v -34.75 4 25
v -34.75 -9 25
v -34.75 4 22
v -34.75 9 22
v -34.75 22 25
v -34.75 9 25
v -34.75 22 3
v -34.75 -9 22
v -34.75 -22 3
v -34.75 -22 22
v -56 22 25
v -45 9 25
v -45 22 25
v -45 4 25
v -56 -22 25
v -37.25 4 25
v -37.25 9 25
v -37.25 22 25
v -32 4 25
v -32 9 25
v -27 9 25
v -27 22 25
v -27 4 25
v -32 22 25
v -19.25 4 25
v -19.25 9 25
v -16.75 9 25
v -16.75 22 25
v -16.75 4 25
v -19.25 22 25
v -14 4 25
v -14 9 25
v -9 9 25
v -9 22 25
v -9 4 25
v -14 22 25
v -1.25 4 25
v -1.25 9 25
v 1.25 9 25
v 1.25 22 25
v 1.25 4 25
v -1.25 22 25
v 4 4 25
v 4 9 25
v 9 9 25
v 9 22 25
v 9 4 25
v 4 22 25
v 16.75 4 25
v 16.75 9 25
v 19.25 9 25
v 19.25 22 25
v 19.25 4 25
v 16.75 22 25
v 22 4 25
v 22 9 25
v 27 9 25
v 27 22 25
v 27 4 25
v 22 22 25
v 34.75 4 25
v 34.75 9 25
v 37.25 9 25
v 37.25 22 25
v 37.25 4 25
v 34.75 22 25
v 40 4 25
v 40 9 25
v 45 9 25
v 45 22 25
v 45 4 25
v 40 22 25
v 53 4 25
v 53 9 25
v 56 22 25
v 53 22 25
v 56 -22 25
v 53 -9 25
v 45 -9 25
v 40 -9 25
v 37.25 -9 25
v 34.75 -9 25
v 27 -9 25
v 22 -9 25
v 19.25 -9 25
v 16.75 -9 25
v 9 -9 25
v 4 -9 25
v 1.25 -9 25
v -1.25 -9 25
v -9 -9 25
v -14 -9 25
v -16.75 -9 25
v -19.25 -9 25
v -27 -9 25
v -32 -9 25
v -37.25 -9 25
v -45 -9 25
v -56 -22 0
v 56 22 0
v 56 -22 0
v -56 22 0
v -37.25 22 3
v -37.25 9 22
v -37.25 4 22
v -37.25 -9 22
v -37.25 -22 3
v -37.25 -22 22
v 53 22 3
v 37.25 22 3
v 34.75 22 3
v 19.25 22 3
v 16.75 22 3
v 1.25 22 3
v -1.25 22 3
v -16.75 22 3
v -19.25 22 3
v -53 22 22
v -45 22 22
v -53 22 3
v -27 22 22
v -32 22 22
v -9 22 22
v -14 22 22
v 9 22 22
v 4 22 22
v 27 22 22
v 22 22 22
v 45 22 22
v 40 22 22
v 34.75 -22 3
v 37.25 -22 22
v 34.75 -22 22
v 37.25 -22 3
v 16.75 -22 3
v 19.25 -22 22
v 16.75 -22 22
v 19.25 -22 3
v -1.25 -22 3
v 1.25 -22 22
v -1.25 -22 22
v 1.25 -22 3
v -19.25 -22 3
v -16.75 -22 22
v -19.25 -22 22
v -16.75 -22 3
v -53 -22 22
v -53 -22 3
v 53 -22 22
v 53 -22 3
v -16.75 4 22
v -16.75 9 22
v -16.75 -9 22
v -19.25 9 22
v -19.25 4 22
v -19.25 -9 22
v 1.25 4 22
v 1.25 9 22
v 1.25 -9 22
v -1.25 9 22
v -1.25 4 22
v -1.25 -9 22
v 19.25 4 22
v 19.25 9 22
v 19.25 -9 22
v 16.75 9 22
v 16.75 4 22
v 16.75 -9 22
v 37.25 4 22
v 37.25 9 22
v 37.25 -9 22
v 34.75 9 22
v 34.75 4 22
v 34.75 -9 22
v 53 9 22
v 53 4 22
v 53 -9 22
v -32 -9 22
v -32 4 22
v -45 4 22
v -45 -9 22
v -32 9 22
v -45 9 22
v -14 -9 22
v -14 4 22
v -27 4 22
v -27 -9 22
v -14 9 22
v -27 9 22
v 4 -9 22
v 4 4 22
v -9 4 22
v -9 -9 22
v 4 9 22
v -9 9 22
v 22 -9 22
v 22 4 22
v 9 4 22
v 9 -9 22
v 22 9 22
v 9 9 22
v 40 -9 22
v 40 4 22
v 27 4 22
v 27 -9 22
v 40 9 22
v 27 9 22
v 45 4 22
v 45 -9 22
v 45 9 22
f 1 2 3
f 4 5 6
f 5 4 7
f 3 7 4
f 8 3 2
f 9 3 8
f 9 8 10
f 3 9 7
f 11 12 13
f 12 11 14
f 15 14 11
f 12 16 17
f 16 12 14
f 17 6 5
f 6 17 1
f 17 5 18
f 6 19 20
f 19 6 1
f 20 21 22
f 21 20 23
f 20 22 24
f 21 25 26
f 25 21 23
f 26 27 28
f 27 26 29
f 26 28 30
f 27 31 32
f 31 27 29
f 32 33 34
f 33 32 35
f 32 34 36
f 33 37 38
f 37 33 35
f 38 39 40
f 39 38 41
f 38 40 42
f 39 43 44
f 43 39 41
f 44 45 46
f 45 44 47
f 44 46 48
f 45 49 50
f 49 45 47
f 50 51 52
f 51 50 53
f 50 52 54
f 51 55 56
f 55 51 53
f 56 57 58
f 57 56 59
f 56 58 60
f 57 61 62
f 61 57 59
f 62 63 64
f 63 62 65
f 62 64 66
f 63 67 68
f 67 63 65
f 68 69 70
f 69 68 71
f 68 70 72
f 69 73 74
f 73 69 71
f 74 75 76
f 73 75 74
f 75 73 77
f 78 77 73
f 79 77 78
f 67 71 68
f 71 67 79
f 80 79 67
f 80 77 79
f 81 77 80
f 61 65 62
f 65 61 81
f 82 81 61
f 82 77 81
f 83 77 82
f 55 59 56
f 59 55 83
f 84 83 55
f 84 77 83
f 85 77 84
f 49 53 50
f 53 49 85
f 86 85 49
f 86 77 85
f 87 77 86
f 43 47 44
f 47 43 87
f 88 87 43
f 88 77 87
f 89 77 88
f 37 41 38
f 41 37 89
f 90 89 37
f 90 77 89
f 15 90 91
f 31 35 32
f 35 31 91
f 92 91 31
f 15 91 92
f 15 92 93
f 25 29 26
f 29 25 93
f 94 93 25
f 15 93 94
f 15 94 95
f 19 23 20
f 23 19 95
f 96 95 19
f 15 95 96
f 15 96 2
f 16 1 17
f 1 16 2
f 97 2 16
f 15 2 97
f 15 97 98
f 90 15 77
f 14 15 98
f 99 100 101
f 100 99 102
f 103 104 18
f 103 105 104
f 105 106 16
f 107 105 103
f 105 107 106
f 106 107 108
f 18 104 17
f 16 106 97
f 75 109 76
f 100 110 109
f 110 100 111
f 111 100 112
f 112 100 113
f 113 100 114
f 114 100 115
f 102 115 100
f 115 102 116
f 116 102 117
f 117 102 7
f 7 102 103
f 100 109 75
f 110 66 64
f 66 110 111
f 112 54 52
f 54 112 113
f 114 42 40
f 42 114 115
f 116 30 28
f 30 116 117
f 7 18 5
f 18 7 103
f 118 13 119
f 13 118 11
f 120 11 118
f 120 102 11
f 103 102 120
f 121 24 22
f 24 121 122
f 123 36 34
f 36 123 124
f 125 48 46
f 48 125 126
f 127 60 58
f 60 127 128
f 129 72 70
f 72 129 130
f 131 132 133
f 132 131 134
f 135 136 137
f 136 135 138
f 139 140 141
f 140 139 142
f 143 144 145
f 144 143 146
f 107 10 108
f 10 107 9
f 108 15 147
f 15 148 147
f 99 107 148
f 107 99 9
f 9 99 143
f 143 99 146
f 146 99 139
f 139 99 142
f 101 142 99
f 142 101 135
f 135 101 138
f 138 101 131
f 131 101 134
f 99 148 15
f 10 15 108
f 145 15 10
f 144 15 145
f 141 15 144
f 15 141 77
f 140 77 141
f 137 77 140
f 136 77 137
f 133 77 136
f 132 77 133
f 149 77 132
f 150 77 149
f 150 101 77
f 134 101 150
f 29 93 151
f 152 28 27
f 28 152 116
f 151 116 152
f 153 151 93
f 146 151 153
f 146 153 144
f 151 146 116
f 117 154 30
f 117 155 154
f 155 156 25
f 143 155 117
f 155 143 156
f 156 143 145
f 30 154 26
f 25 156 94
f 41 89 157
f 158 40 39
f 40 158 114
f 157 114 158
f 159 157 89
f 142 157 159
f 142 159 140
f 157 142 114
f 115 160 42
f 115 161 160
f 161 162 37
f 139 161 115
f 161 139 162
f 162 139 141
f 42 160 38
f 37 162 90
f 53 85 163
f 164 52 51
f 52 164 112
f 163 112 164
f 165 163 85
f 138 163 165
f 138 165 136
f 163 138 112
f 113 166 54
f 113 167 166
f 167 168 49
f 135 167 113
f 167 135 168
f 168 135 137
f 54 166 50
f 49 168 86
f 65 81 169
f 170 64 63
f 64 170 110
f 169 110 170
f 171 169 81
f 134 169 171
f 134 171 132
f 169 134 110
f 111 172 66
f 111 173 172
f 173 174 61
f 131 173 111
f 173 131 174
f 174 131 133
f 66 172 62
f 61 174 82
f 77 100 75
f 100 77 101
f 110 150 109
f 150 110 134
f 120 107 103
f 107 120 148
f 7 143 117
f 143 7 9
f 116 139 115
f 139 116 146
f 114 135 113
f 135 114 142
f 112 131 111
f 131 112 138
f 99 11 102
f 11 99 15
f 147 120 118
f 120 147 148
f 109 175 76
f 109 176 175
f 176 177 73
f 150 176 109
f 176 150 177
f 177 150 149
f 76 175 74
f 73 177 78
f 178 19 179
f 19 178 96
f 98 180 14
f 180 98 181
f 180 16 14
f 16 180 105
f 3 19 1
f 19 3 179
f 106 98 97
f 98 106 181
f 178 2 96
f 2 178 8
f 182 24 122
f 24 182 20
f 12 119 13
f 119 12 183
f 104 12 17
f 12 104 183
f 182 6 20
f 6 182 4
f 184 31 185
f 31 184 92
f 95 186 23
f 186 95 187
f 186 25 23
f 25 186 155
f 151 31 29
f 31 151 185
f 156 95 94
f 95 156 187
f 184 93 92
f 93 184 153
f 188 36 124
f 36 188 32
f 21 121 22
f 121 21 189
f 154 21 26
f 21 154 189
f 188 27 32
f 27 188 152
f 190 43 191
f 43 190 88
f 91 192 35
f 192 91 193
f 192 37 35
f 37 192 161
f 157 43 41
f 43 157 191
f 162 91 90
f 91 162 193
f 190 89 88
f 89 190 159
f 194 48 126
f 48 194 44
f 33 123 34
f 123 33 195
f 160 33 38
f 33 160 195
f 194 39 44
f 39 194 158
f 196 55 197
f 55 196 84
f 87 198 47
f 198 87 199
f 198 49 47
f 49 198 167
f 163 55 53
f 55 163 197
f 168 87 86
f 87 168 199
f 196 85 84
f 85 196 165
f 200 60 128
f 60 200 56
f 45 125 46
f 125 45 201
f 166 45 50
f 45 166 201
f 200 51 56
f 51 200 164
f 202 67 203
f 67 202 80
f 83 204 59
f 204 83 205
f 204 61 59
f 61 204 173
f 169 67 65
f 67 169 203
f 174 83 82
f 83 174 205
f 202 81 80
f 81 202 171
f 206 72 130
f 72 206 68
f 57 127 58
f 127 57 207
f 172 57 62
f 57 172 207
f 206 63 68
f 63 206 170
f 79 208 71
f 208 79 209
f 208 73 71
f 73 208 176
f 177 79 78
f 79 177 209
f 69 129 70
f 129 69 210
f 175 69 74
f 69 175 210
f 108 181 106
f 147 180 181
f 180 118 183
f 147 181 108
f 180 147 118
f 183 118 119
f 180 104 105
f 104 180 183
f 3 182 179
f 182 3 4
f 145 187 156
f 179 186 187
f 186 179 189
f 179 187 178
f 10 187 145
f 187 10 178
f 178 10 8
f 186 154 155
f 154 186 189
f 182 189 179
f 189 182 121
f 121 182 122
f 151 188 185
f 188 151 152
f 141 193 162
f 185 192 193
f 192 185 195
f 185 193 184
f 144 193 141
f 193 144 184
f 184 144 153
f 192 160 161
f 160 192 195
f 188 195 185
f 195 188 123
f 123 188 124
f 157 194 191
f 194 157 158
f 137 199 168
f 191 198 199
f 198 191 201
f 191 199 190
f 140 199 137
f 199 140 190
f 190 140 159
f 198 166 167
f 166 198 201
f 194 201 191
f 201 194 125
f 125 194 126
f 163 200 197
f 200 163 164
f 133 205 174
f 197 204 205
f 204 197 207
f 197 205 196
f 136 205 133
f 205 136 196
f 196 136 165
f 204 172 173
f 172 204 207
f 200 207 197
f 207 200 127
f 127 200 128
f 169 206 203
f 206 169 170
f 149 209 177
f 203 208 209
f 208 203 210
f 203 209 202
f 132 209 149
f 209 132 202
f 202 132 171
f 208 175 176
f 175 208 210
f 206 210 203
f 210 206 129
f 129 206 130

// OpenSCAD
// Open-sided cuvette rack for twelve 12.5mm square cuvettes.
// Corrected to ensure a single manifold body and holes only in the deck.

// --- Dimensions ---
base_x      = 112.0;    // Length of base plate (X)
base_y      = 44.0;     // Width of base plate (Y)
base_z      = 3.0;      // Thickness of base plate (Z)

deck_x      = 112.0;    // Length of deck plate (X)
deck_y      = 44.0;     // Width of deck plate (Y)
deck_z_min  = 22.0;     // Bottom of deck plate (Z)
deck_z_max  = 25.0;     // Top of deck plate (Z)

wall_end_t  = 3.0;      // Thickness of end walls (X-direction)
wall_rib_t  = 2.5;      // Thickness of internal ribs (X-direction)
wall_depth  = 44.0;     // Depth of walls (Y-direction)
wall_height = 25.0;     // Total height of walls (Z)

hole_size   = 13.0;     // Size of cuvette holes (X and Y)
hole_pitch  = 18.0;     // Center-to-center spacing of holes (X and Y)
rows        = 2;        // Number of rows (Y)
cols        = 6;        // Number of columns (X)

$fn = 64;

// --- Calculations ---
hole_offset_x = (cols - 1) * hole_pitch / 2;
hole_offset_y = (rows - 1) * hole_pitch / 2;

// --- Geometry ---

module walls_and_base() {
    // Base Plate
    translate([-base_x/2, -base_y/2, 0])
        cube([base_x, base_y, base_z]);

    // End Walls (Flush with short ends)
    // Left end wall
    translate([-base_x/2, -base_y/2, 0])
        cube([wall_end_t, base_y, wall_height]);
    // Right end wall
    translate([base_x/2 - wall_end_t, -base_y/2, 0])
        cube([wall_end_t, base_y, wall_height]);

    // Internal Ribs
    for (rx = [-36, -18, 0, 18, 36]) {
        translate([rx - wall_rib_t/2, -wall_depth/2, 0])
            cube([wall_rib_t, wall_depth, wall_height]);
    }
}

module deck_only() {
    translate([-deck_x/2, -deck_y/2, deck_z_min])
        cube([deck_x, deck_y, deck_z_max - deck_z_min]);
}

// Final Assembly
// We use union to join base/walls, then union the deck, 
// then difference the holes ONLY from the deck.
union() {
    walls_and_base();
    
    // The deck is handled separately to allow hole subtraction without affecting walls/base
    difference() {
        deck_only();
        
        // Holes (Cutting through the deck)
        for (i = [0 : cols - 1]) {
            for (j = [0 : rows - 1]) {
                translate([
                    (i * hole_pitch) - hole_offset_x, 
                    (j * hole_pitch) - hole_offset_y, 
                    deck_z_min - 0.1 // Ensure it cuts through the bottom of the deck
                ])
                    cube([hole_size, hole_size, (deck_z_max - deck_z_min) + 0.2]);
            }
        }
    }
}
